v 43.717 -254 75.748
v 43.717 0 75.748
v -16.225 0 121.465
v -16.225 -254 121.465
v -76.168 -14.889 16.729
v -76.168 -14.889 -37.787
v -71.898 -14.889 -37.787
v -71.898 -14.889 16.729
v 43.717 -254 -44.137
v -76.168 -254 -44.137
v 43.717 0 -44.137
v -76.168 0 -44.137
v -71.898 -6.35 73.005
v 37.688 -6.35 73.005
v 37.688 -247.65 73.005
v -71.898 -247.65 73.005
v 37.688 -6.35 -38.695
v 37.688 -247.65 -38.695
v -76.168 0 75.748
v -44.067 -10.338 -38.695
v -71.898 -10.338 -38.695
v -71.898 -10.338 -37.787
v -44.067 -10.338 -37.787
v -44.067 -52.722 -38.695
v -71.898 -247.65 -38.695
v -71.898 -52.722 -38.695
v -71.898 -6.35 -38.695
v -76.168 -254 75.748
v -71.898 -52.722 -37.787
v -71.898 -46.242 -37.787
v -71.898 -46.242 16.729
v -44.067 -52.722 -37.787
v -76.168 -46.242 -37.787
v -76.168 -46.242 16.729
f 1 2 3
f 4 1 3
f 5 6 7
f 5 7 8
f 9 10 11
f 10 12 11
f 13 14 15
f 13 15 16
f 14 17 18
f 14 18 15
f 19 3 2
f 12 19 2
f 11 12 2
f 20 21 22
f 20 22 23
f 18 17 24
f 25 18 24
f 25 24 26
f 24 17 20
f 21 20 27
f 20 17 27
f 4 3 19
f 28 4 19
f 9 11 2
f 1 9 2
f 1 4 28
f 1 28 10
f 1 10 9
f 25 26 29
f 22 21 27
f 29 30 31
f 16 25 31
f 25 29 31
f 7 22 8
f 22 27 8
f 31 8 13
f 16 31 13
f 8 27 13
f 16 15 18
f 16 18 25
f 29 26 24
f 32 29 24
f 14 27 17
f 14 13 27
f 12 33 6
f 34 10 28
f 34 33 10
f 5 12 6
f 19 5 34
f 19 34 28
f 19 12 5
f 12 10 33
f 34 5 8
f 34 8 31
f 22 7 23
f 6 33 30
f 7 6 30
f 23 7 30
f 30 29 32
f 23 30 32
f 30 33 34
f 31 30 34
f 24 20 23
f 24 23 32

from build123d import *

# Parameters (mm, degrees)
F0_W     = 119.885028
F0_H     = 119.885028
F1_DEPTH = 254
F2_W     = 109.586086
F2_H     = 111.699324
F3_DEPTH = 247.65
F4_W     = 31.353211
F4_H     = 60.86609
F5_DEPTH = 25.4
F6_W     = 116.465766
F6_H     = 116.456397
F7_DEPTH = 6.35
F8_W     = 32.10051
F8_H     = 42.383331
F9_DEPTH = 6.35


with BuildPart() as f1:
    # F0 (on Front) → F1 (new body)
    with BuildSketch(Plane.XZ):
        Polygon((-16.225174, 121.46537), (-76.167688, 75.748228), (43.71734, 75.748228), align=None)
        with Locations((-16.225174, 15.805714)):
            Rectangle(F0_W, F0_H)
    extrude(amount=F1_DEPTH)

    # F2 (on face) → F3 (cut)
    with BuildSketch(Plane(origin=(0, 0, 0), x_dir=(-1, 0, 0), z_dir=(0, 1, 0))):
        with Locations((17.105127, 17.154949)):
            Rectangle(F2_W, F2_H)
    extrude(amount=-F3_DEPTH, mode=Mode.SUBTRACT)

    # F4 (on face) → F5 (cut)
    with BuildSketch(Plane(origin=(-76.167688, 0, 0), x_dir=(0, -1, 0), z_dir=(-1, 0, 0))):
        with Locations((30.565259, -13.703755)):
            Rectangle(F4_W, F4_H)
    extrude(amount=-F5_DEPTH, mode=Mode.SUBTRACT)

    # F6 (on Front) → F7 (join)
    with BuildSketch(Plane.XZ):
        with Locations((-15.793322, 16.630638)):
            Rectangle(F6_W, F6_H)
    extrude(amount=F7_DEPTH)

    # F8 (on face) → F9 (join)
    with BuildSketch(Plane(origin=(0, 0, -44.1368), x_dir=(1, 0, 0), z_dir=(0, 0, -1))):
        with Locations((-60.117433, 31.530009)):
            Rectangle(F8_W, F8_H)
    extrude(amount=-F9_DEPTH)


solid = f1.part
